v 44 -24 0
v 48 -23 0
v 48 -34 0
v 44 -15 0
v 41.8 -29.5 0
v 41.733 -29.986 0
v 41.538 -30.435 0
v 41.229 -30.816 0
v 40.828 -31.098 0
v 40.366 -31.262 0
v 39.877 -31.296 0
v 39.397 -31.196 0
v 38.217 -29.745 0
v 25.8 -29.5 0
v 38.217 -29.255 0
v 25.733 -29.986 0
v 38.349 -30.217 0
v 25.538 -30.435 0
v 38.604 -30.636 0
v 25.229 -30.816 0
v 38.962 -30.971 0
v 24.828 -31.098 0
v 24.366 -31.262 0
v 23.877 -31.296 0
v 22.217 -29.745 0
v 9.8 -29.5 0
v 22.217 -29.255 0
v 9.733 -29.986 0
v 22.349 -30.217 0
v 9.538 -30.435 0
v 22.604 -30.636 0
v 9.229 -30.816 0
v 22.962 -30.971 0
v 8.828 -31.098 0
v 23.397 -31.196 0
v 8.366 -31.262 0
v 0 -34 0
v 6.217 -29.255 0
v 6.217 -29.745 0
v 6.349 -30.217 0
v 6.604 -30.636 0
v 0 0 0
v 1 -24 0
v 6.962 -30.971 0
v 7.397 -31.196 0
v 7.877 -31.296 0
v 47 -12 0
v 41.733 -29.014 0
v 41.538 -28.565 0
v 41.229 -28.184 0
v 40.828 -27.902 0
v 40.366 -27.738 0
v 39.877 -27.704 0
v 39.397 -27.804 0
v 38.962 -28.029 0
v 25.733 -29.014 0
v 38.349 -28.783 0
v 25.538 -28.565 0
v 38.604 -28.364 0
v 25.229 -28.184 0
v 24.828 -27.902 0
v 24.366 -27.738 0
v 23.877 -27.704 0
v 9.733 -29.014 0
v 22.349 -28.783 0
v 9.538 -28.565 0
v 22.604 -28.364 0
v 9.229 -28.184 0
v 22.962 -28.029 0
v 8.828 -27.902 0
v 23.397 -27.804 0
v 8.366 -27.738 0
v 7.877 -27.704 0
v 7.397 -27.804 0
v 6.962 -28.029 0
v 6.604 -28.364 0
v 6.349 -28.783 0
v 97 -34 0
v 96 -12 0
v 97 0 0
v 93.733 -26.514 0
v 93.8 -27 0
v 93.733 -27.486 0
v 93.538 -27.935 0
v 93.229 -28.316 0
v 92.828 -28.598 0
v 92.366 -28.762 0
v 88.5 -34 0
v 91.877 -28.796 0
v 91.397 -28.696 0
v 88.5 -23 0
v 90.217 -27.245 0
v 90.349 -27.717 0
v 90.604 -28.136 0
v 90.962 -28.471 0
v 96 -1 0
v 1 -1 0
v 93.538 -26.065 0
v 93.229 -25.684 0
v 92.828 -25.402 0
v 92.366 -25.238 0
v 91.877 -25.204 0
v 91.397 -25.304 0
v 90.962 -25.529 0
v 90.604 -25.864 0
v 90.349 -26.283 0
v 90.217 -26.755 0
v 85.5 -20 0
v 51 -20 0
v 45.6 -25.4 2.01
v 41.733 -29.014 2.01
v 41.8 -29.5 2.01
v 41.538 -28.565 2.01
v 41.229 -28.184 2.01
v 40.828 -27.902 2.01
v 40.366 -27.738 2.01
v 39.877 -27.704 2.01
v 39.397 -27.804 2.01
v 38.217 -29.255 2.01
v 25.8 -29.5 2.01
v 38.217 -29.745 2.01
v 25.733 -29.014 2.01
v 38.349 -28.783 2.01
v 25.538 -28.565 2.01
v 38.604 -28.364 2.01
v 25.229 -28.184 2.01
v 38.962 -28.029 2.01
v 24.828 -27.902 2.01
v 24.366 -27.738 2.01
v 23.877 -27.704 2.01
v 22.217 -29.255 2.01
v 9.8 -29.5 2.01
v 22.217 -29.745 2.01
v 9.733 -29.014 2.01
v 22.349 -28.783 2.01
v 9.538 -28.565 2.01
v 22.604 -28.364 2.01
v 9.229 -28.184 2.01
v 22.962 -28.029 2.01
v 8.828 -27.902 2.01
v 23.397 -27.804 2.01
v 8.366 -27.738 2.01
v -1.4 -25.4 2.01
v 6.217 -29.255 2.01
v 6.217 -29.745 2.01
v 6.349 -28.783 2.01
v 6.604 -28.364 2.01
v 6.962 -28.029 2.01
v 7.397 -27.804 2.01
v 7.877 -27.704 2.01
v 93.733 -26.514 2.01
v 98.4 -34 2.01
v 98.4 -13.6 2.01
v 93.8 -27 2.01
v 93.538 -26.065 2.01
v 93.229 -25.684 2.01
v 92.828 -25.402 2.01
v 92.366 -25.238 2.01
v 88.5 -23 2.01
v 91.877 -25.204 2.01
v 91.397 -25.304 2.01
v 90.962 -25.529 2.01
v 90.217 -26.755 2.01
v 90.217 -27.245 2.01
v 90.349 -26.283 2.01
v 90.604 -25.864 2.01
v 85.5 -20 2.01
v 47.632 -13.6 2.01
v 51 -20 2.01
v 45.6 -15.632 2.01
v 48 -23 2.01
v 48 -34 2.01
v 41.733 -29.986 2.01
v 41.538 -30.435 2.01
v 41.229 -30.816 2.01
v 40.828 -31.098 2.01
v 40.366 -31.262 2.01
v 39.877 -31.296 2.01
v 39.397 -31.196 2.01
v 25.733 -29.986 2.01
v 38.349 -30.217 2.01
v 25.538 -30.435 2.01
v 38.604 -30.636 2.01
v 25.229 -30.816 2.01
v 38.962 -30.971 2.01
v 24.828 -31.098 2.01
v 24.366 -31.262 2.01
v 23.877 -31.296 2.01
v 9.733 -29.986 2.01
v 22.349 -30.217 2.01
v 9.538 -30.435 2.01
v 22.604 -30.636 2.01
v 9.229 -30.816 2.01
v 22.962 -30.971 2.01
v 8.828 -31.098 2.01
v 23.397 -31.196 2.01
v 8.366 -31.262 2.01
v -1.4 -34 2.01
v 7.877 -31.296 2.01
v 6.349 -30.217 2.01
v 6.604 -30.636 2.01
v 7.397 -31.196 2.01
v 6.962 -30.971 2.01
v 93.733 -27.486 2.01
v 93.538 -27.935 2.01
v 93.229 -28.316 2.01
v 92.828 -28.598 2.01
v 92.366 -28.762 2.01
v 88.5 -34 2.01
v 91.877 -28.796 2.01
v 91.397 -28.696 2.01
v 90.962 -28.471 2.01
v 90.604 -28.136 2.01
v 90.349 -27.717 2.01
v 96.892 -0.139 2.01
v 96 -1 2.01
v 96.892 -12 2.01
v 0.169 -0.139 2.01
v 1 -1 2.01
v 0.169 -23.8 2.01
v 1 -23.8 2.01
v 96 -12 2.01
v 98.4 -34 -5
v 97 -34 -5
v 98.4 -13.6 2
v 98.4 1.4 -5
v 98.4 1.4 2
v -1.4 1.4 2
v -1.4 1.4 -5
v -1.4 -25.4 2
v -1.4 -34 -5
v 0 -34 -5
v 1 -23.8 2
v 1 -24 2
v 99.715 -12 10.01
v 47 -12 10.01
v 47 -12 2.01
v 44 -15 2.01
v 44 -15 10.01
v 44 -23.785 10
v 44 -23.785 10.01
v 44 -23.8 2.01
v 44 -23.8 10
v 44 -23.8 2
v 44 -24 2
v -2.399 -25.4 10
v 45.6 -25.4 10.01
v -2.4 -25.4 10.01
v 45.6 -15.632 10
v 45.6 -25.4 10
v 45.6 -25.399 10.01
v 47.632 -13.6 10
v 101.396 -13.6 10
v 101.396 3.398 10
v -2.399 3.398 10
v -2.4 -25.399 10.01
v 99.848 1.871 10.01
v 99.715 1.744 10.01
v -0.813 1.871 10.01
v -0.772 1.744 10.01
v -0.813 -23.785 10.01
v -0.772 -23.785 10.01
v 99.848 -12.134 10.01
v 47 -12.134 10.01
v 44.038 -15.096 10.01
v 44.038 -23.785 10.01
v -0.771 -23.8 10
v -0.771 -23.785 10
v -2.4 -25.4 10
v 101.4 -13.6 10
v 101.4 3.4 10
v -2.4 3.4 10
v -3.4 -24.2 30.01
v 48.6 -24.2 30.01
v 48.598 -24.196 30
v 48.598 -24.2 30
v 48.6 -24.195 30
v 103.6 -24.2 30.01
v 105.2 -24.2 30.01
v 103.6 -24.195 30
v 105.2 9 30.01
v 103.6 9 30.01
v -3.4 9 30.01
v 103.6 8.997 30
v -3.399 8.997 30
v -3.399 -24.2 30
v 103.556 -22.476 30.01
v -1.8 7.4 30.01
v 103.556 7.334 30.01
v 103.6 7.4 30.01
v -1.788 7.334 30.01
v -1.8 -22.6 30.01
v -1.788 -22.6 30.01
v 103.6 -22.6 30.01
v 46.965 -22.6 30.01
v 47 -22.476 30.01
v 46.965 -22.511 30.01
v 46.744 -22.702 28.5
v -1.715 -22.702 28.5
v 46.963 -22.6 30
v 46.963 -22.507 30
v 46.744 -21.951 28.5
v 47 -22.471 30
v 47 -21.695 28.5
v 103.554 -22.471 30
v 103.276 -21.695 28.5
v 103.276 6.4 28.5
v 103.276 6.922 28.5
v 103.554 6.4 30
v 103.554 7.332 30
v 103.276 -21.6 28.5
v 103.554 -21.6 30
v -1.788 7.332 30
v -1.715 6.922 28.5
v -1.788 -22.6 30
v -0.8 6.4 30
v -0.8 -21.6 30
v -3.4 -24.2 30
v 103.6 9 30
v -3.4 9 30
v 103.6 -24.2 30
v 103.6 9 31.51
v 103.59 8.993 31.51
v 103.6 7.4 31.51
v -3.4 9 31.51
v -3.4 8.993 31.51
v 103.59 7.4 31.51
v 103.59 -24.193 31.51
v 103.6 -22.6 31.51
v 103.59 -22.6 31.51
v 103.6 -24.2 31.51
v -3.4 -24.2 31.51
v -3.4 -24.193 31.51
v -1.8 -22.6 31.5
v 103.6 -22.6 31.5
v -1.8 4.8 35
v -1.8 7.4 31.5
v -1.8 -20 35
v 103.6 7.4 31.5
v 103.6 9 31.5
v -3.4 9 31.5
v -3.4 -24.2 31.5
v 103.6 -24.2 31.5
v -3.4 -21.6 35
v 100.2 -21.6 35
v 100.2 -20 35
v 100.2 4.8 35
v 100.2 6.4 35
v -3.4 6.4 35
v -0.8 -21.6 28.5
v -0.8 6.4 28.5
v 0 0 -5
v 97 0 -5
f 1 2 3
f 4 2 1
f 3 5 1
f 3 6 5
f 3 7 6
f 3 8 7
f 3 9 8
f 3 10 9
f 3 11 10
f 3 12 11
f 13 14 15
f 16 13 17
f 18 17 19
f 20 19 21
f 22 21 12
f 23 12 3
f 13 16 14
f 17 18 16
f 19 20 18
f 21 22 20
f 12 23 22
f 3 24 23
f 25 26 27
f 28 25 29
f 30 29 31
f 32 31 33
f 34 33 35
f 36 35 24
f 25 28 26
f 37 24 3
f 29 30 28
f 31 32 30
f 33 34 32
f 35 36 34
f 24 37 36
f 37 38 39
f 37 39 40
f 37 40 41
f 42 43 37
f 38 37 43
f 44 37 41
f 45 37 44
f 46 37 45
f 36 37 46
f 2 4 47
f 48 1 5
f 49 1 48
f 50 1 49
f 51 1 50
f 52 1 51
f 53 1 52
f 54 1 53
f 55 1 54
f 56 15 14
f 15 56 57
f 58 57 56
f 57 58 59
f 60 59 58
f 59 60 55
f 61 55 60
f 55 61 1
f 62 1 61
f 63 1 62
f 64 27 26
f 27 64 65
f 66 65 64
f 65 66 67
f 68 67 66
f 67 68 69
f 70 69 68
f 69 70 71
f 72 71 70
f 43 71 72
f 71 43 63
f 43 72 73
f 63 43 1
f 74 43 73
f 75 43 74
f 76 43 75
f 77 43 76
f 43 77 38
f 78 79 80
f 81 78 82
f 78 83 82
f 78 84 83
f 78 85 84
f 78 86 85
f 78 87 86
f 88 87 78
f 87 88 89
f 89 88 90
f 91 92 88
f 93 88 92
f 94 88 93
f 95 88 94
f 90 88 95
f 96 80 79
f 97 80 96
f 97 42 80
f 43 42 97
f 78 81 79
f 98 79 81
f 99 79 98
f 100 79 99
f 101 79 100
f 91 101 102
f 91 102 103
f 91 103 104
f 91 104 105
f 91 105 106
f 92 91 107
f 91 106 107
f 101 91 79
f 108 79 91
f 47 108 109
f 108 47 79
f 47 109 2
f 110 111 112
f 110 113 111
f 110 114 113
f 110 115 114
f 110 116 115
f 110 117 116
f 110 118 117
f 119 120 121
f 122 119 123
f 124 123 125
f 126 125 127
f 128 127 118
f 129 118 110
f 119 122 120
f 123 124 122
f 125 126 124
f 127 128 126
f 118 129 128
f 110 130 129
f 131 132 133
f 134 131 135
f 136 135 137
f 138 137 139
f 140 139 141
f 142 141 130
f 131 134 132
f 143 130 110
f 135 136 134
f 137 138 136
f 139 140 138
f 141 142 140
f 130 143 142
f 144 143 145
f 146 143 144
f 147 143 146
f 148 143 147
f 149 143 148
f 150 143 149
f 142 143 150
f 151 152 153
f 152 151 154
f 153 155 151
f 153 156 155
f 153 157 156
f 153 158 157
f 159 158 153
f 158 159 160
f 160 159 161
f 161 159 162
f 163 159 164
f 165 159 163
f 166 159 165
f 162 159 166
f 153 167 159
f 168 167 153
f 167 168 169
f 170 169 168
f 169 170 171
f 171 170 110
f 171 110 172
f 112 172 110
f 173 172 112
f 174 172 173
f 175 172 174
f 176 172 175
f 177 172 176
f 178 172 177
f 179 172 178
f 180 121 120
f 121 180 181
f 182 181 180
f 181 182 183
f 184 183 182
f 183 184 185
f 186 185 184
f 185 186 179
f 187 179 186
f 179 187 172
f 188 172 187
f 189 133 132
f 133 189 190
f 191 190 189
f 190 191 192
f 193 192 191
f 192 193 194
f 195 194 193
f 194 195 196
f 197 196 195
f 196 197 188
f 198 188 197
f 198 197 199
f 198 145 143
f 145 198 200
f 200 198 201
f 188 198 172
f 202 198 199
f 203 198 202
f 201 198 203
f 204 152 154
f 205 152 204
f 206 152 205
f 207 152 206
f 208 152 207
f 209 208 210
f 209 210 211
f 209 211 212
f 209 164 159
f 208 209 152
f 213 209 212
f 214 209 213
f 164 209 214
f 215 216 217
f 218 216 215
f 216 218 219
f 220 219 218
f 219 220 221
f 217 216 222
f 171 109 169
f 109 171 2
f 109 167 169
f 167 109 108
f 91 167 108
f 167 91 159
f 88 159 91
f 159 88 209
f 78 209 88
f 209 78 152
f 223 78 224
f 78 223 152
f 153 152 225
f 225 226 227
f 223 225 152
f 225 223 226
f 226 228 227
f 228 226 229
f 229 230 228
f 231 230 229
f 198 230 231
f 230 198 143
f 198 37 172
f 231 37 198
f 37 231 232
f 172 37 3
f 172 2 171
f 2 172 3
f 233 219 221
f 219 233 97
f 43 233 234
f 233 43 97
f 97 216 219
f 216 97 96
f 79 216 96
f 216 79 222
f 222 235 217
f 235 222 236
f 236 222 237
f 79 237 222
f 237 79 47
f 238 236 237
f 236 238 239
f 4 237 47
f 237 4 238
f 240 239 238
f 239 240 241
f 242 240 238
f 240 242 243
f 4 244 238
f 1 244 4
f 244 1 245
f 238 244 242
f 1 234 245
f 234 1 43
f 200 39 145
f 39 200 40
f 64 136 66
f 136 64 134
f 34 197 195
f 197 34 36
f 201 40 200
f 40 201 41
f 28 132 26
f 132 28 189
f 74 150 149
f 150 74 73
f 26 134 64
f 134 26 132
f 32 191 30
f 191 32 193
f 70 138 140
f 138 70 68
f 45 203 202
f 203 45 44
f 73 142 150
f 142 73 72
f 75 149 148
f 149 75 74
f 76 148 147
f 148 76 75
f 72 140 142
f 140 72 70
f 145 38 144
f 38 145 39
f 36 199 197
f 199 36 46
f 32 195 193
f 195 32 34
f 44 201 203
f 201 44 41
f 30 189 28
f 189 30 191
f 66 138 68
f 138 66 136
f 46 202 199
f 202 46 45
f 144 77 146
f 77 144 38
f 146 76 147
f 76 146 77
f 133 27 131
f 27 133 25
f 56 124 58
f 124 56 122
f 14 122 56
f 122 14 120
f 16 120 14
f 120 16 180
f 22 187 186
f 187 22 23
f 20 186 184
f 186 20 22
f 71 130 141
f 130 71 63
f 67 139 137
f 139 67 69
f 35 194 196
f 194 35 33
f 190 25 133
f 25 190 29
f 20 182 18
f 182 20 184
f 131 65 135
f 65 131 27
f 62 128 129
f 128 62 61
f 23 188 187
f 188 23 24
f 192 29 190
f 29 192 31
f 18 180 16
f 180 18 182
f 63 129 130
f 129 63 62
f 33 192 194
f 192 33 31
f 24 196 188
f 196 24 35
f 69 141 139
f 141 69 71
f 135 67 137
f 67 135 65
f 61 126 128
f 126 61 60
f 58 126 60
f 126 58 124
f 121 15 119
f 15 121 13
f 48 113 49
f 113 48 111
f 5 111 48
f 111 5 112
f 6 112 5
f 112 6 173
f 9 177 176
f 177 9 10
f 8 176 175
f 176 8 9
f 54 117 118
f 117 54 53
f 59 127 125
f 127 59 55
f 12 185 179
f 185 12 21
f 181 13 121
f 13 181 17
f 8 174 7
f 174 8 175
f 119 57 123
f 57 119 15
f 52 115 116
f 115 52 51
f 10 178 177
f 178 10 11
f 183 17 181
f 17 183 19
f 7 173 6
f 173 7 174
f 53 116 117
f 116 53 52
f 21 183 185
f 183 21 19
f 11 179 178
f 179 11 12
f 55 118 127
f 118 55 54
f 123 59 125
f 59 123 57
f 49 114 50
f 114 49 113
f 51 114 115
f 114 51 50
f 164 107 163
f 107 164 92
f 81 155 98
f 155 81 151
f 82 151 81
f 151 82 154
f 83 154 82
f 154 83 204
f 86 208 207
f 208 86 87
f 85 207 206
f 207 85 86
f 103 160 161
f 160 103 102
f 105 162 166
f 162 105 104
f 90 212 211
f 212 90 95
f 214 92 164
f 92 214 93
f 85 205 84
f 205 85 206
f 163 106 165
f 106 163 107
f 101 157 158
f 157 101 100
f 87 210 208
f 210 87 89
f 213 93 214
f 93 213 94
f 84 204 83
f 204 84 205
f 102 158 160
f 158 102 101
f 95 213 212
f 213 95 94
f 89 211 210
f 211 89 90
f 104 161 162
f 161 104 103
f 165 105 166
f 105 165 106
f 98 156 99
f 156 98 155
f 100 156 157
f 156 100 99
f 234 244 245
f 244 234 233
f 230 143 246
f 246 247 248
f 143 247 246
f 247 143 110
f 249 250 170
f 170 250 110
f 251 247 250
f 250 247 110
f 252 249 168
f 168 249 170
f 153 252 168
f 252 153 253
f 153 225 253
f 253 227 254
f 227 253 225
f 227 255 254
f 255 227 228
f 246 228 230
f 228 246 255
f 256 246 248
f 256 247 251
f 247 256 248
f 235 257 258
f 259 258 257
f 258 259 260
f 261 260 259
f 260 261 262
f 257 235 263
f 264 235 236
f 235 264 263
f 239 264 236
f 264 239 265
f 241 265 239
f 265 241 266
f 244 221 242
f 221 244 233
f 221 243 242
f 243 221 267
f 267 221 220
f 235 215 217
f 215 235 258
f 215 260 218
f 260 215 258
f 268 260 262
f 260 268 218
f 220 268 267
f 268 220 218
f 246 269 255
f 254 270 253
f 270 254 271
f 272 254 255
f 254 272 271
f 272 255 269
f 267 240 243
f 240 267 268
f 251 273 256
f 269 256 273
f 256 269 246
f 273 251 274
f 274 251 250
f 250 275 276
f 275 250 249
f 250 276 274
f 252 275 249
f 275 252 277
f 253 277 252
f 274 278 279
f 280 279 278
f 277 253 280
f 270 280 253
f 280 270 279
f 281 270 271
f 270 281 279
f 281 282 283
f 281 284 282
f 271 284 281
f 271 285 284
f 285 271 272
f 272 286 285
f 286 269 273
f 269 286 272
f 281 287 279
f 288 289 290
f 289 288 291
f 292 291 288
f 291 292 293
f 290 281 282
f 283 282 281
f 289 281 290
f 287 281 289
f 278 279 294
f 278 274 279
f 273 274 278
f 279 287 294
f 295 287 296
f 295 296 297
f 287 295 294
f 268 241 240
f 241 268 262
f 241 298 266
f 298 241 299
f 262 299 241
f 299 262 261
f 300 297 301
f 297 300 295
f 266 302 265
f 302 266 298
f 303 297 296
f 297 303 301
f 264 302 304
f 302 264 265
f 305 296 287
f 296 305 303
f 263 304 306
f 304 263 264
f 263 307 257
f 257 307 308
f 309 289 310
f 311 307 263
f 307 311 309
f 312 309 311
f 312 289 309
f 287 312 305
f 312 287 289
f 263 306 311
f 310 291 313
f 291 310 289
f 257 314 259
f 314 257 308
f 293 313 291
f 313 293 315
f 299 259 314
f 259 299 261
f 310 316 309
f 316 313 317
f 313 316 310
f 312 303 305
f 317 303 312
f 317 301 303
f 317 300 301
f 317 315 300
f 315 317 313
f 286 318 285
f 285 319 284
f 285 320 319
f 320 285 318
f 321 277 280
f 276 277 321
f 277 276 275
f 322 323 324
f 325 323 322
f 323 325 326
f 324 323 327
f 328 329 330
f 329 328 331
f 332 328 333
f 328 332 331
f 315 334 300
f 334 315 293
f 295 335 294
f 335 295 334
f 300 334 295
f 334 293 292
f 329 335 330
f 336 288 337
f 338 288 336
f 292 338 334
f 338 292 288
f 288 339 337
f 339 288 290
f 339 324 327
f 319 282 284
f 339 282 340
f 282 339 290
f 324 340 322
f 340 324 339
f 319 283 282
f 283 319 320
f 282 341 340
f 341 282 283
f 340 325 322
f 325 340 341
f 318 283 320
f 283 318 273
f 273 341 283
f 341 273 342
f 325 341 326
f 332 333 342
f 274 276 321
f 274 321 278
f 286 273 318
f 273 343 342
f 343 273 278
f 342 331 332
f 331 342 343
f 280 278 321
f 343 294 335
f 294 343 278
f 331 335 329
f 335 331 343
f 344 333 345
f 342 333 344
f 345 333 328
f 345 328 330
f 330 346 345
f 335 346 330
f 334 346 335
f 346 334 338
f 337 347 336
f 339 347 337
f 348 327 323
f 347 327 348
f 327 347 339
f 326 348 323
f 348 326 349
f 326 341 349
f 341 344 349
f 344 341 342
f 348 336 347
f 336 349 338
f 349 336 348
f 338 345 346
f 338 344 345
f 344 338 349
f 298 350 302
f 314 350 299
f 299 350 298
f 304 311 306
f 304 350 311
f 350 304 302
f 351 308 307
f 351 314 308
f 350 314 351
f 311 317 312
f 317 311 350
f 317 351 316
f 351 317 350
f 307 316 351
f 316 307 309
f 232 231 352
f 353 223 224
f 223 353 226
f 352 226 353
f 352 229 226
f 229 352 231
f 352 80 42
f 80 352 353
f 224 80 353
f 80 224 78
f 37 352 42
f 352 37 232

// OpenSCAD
$fs=0.5;
$fa=1;
$fn=0;

module lip(th = 2) {
  linear_extrude(5.01) polygon([
    [-th, th], [97+th, th], [97+th, -34], [97, -34], [97, 0], [0, 0], [0, -34], [-th, -34]
   ]);
}

module base(th = 2) {
  shape = [
    [-th, th], [97+th, th], [97+th, -34], [95-6.5, -34],
    [95-6.5, -23], [95-6.5-3, -20], [1+43+4+3, -20], [1+43+4, -23],
    [1+43+4, -34], [-th, -34]
  ];
  hole = [
    [1, -1], [96, -1], [96, -12], [1+43+3, -12],
    [1+43, -12-3], [1+43, -24], [1, -24]];

  difference() {
    linear_extrude(2.01) polygon(concat(shape, hole), [
      [for (i = [0:9]) i], [for (i = [10:16]) i]
    ]);
  
    translate([8, -34+4.5, -0.5]) cylinder(h = 3, r = 1.8);
    translate([8+16, -34+4.5, -0.5]) cylinder(h = 3, r = 1.8);
    translate([8+16+16, -34+4.5, -0.5]) cylinder(h = 3, r = 1.8);
    translate([95-3, -34+7, -0.5]) cylinder(h = 3, r = 1.8);
    //translate([1+43+3.5, -24, 2.01]) cube([1, 0.2, 0.1], center=true);
    //translate([1+43+3.5, -20, 2.01]) cube([1, 0.2, 0.1], center=true);
  }
}

function reverse(list) = [ for (i = [len(list)-1 : -1 : 0]) list[i] ];

// https://stackoverflow.com/a/78582473
module extrude_between(points0, points1, height, convexity=2) {
    N = len(points0);
    assert(len(points1) == N);
    bottom_pts = [for (i=[0:N-1]) [points0[i].x, points0[i].y, 0]];
    top_pts    = [for (i=[0:N-1]) [points1[i].x, points1[i].y, height]];
    bottom_face = [for (i=[0:N-1]) i];
    top_face    = [for (i=[0:N-1]) 2*N - i - 1];
    side_faces  = [for (i=[0:N-1]) let (j=(i+1)%N) [i+N, j+N, j, i]];
    polyhedron(
        [each bottom_pts, each top_pts],
        [bottom_face, each side_faces, top_face],
        convexity=convexity
    );
}

module duct1(lipth, dth = 2) {
  shape0 = [
    [-lipth, lipth],
    [97+lipth, lipth],
    [97+lipth, -12-dth],
    [1+43+3+sqrt(dth)/2, -12-dth],
    [1+43+dth, -12-3-sqrt(dth)/2],
    [1+43+dth, -26+(dth-1)],
    [-lipth, -26+(dth-1)],
  ];

  skewLeft = 1;
  skewTop = 2;
  skewRight = 3;

  shape1 = [
    [shape0[0][0]-skewLeft, shape0[0][1]+skewTop],
    [shape0[1][0]+skewRight, shape0[1][1]+skewTop],
    [shape0[2][0]+skewRight, shape0[2][1]],
    shape0[3],
    shape0[4],
    shape0[5],
    [shape0[6][0]-skewLeft, shape0[6][1]],
  ];

  hole0 = [
    [shape0[0][0]+dth, shape0[0][1]-dth],
    [shape0[1][0]-dth, shape0[1][1]-dth],
    [shape0[2][0]-dth, shape0[2][1]+dth],
    [shape0[3][0]-sqrt(dth)/2, shape0[3][1]+dth],
    [shape0[4][0]-dth, shape0[4][1]+sqrt(dth)/2],
    [shape0[5][0]-dth, shape0[5][1]+dth],
    [shape0[6][0]+dth, shape0[6][1]+dth],
  ];

  hole1 = [
    [hole0[0][0]-skewLeft, hole0[0][1]+skewTop],
    [hole0[1][0]+skewRight, hole0[1][1]+skewTop],
    [hole0[2][0]+skewRight, hole0[2][1]],
    hole0[3],
    hole0[4],
    hole0[5],
    [hole0[6][0]-skewLeft, hole0[6][1]],
  ];

    difference() {
      extrude_between(reverse(shape0), reverse(shape1), 8.01);
      translate([0, 0, -0.25]) extrude_between(reverse(hole0), reverse(hole1), 8.5);
    }
}

module duct2(lipth, dth = 2) {
  shape0 = [
    [-1-lipth, 2+lipth],
    [100+lipth, 2+lipth],
    [100+lipth, -12-dth],
    [1+43+3+sqrt(dth)/2, -12-dth],
    [1+43+dth, -12-3-sqrt(dth)/2],
    [1+43+dth, -26+(dth-1)],
    [-1-lipth, -26+(dth-1)],
  ];

  skewLeft = 1;
  skewTop = 4 + dth;
  skewRight = 3.8;
  skewBottomNarrow = 9 + dth;

  shape1 = [
    [shape0[0][0]-skewLeft, shape0[0][1]+skewTop],
    [shape0[1][0]+skewRight, shape0[1][1]+skewTop],
    [shape0[2][0]+skewRight, shape0[2][1]-skewBottomNarrow],
    [shape0[3][0]+5,shape0[3][1]-skewBottomNarrow],
    [shape0[4][0]+3,shape0[3][1]-skewBottomNarrow],
    [shape0[5][0]-5,shape0[3][1]-skewBottomNarrow],
    [shape0[6][0]-skewLeft, shape0[3][1]-skewBottomNarrow],
  ];

  hole0 = [
    [shape0[0][0]+dth, shape0[0][1]-dth],
    [shape0[1][0]-dth, shape0[1][1]-dth],
    [shape0[2][0]-dth, shape0[2][1]+dth],
    [shape0[3][0]-sqrt(dth)/2, shape0[3][1]+dth],
    [shape0[4][0]-dth, shape0[4][1]+sqrt(dth)/2],
    [shape0[5][0]-dth, shape0[5][1]+dth],
    [shape0[6][0]+dth, shape0[6][1]+dth],
  ];

  hole1 = [
    [hole0[0][0]-skewLeft, hole0[0][1]+skewTop],
    [hole0[1][0]+skewRight, hole0[1][1]+skewTop],
    [hole0[2][0]+skewRight, hole0[2][1]-skewBottomNarrow],
    [hole0[3][0]+5, hole0[3][1]-skewBottomNarrow],
    [hole0[4][0]+3, hole0[3][1]-skewBottomNarrow],
    [hole0[5][0]-5, hole0[3][1]-skewBottomNarrow],
    [hole0[6][0]-skewLeft, hole0[3][1]-skewBottomNarrow],
  ];
  echo("topleft", shape1[0]);
  echo("fanx", shape1[1][0] - shape1[0][0] - dth);
  echo("fany", hole1[1][1] - hole1[6][1]);
    difference() {
      extrude_between(reverse(shape0), reverse(shape1), 20.01);
      translate([0, 0, -0.25]) extrude_between(reverse(hole0), reverse(hole1), 20.5);
    }
}

module fanmount (dth = 2) {
  shape0 = [
    [-dth, dth],
    [107-dth, dth],
    [107-dth, 0],
    [0, 0],
    [0, -30],
    [107-dth, -30],
    [107-dth, -30-dth],
    [-dth, -30-dth]];
  translate([dth, -dth, 0]) linear_extrude(1.51) polygon(shape0);

  narrow = 2.6;

  shape1 = [
    [-dth, dth-narrow],
    [107-5, dth-narrow],
    [107-5, -narrow],
    [0, -narrow],
    [0, -30+narrow],
    [107-5, -30+narrow],
    [107-5, -30-dth+narrow],
    [-dth, -30-dth+narrow]
  ];

  translate([dth, -dth, 1.5]) extrude_between(reverse(shape0), reverse(shape1), 3.5);

  nudge = 1;

  shape2 = [
    [-dth+nudge, dth-nudge],
    [107-nudge, dth-nudge],
    [107-nudge, 0-nudge],
    [0+nudge, 0-nudge],
    [0+nudge, -30+nudge],
    [107-nudge, -30+nudge],
    [107-nudge, -30-dth+nudge],
    [-dth+nudge, -30-dth+nudge]];
  translate([dth, -dth, -1.5]) linear_extrude(1.5) polygon(shape2);
  
  
}

translate([0, 0, -5]) lip(1.4);
base(1.4);
translate([0, 0, 2]) duct1(1.4, 1.6);
translate([0, 0, 10]) duct2(1.4, 1.6);
translate([-3.4, 9, 30]) fanmount(1.6);
